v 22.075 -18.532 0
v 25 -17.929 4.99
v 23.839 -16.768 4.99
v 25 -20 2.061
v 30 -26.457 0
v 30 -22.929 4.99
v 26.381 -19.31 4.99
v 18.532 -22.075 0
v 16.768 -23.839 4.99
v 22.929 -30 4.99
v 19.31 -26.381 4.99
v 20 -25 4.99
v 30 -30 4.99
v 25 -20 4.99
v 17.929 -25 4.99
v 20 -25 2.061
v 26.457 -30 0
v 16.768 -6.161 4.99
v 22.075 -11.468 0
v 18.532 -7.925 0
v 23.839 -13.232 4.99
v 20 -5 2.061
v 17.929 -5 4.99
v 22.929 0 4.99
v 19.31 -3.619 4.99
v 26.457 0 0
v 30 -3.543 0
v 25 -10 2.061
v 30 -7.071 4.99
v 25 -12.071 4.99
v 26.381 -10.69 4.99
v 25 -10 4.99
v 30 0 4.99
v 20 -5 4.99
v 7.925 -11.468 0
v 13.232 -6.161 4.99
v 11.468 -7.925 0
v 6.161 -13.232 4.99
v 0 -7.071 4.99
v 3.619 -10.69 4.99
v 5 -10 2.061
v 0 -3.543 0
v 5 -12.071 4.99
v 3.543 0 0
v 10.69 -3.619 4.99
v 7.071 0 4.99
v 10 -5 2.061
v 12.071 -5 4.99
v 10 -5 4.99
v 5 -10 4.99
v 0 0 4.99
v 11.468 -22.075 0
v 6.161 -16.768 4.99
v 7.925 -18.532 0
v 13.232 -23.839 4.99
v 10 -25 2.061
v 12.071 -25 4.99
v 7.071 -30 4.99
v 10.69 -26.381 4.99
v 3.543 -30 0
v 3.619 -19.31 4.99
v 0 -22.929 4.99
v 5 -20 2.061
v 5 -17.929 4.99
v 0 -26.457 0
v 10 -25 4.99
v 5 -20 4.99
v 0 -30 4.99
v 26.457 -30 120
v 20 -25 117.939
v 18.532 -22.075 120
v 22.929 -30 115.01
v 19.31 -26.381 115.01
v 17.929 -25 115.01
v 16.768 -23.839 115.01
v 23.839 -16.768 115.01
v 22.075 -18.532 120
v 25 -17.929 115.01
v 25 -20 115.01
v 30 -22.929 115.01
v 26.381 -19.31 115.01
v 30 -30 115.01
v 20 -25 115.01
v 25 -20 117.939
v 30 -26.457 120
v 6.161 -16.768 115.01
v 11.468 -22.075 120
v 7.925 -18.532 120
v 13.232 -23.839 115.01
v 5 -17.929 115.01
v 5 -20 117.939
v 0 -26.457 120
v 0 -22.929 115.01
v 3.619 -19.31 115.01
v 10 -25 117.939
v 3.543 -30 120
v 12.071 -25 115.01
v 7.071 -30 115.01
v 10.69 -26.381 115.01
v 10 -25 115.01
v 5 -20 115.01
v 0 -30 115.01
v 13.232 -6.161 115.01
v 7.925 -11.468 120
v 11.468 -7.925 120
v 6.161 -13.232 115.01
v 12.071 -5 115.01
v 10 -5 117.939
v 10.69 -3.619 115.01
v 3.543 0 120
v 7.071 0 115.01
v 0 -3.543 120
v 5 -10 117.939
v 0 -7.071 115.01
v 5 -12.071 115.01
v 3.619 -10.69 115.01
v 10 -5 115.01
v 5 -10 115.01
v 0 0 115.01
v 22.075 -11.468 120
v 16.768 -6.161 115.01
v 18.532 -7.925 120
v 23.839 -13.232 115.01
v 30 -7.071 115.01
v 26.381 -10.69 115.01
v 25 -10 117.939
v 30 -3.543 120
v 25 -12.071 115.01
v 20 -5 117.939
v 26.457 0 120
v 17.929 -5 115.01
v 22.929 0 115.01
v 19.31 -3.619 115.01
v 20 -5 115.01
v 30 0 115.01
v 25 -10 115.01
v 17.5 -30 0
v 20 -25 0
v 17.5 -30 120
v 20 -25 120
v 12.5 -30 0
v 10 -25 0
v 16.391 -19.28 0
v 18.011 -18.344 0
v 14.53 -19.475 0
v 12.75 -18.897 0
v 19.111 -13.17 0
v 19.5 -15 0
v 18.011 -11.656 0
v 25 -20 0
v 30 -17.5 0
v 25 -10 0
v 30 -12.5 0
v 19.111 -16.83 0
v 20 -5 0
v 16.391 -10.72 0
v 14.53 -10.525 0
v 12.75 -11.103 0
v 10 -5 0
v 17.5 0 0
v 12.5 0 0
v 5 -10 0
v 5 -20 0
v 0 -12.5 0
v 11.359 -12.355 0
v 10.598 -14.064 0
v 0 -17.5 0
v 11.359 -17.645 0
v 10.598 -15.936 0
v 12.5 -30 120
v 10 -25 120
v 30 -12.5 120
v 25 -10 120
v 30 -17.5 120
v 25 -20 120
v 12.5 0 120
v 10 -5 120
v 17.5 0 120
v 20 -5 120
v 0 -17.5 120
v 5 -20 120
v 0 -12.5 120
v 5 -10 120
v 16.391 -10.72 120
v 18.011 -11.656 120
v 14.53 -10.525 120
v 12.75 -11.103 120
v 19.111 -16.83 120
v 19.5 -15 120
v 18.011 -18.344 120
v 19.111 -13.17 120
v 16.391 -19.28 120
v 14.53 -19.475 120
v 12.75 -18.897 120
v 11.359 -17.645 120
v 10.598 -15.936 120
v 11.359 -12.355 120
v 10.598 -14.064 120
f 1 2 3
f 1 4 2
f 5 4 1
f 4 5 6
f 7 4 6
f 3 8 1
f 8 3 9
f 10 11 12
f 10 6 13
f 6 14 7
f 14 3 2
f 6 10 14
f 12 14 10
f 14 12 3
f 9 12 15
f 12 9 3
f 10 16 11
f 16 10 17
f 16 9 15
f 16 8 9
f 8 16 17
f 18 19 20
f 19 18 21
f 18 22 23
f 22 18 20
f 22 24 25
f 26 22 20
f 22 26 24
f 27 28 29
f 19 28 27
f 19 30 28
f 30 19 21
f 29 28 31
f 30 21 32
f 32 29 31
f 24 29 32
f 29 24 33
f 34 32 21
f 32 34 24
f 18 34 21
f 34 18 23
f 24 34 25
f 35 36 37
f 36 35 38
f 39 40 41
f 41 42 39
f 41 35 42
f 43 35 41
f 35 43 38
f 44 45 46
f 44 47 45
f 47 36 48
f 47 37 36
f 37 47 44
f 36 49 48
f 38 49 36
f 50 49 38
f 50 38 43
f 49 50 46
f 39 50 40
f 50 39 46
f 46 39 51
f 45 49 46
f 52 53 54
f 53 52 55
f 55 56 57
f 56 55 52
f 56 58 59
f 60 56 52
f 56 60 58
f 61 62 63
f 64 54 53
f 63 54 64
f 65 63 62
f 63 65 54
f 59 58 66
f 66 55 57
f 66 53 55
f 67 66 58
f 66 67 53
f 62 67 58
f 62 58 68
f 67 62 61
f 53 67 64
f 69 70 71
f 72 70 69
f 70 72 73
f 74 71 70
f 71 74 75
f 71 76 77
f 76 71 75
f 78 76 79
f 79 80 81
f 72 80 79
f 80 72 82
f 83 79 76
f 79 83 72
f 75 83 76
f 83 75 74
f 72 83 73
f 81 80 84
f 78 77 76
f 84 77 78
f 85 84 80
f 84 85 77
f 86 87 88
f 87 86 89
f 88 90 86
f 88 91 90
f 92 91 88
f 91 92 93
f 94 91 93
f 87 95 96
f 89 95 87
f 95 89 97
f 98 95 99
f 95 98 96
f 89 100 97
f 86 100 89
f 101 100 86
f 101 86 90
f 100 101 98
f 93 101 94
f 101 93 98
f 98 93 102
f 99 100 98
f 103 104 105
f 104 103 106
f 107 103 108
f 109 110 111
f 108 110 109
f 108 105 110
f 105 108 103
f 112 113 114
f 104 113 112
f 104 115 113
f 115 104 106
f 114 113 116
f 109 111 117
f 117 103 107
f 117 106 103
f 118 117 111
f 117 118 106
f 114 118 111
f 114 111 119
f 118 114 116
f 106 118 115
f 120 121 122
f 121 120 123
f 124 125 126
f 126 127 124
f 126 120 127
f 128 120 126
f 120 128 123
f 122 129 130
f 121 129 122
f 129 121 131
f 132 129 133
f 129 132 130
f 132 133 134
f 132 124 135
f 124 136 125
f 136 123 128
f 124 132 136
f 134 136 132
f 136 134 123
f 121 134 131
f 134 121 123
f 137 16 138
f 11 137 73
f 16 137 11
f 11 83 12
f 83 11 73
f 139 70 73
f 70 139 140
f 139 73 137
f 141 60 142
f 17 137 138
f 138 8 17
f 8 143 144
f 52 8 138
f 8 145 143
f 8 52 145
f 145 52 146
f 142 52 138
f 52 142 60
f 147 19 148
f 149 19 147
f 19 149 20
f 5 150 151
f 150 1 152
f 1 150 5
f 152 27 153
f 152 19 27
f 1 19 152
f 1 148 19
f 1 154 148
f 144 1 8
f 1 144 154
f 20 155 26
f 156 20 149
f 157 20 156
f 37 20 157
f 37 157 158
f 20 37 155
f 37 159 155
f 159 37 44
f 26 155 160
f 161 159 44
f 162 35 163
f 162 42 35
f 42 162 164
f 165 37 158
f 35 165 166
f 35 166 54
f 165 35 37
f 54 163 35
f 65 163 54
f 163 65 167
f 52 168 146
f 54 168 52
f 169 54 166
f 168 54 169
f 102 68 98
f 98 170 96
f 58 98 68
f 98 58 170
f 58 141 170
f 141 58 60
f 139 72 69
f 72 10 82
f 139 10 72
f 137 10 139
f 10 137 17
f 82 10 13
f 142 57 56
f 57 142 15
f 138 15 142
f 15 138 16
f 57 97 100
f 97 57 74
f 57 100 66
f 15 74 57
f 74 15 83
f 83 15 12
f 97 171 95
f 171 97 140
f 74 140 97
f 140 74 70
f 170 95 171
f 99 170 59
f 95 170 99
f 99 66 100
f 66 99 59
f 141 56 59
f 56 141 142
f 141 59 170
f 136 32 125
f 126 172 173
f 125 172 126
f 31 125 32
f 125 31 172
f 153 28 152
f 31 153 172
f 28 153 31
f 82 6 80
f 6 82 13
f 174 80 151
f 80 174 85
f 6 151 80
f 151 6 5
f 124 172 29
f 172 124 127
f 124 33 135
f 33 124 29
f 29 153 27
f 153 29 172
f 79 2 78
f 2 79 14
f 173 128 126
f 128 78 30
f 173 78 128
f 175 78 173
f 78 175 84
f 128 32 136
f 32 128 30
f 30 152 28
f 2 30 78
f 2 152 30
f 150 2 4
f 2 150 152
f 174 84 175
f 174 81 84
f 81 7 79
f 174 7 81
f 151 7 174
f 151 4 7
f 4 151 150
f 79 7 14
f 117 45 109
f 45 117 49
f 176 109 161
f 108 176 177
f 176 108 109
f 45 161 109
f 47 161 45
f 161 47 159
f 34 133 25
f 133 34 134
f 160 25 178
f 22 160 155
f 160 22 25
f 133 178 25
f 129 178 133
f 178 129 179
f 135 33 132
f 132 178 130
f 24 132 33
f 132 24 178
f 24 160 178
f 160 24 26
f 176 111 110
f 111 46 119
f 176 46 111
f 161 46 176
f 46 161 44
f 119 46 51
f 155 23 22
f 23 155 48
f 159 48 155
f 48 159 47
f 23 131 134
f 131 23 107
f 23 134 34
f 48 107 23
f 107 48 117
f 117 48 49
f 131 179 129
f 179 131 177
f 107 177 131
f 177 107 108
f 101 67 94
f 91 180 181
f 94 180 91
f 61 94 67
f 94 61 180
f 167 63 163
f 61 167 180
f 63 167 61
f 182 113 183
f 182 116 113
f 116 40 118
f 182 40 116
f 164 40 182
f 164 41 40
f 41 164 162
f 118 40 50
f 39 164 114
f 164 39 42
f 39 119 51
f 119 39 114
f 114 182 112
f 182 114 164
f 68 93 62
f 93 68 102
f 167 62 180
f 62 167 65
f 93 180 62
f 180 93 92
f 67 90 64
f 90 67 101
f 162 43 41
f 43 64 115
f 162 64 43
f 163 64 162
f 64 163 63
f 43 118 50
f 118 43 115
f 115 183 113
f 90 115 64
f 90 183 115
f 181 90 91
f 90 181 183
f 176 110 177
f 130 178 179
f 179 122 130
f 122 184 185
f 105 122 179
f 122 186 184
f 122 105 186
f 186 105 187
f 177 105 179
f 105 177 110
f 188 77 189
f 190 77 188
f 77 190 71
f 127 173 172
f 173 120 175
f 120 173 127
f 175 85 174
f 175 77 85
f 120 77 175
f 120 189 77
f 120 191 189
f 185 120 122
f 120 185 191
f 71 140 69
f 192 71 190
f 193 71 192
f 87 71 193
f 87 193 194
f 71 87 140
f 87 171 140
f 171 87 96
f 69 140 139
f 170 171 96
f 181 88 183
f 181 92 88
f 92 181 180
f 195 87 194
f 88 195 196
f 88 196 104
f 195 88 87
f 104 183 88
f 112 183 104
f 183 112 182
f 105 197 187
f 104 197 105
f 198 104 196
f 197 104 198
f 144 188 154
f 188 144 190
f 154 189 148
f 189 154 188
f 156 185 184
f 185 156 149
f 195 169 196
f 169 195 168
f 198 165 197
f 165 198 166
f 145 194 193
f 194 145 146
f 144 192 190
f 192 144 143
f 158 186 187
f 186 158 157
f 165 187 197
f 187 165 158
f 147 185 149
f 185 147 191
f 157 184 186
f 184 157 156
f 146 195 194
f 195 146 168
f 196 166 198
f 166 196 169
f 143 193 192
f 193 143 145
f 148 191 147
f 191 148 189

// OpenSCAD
// file: globals.scad
/*
Most things in this file is represented as one millimeter, so keep that in mind while changing things.
Some of the setting are not mm but at variables that you can set, such as 2*x=2x and you are setting what x is.
I will try to specify when things are variables and not exact measurements.
*/

obj_leg = 30;
leg_length = 5.5;
small_number = 0.001;
metal_core_rode_global = 5;


///////////////// number of holes /////////////////////
z_hole_number = 8;
other_holes = 8;

///////////////// Pins /////////////////////

//pins that poke out
ball_size = 10;
pin_height = 20;
pin_diameter = 6;


//holes
hole_ball_size = ball_size;
hole_pin_height = pin_height;
hole_pin_diameter = pin_diameter;

///////////////// Z THINGS /////////////////////

berring_slot_width = 7.5;
berring_slot_depth = 6.5;
metal_core_rode = 5;

///////////////// X THINGS /////////////////////

//male dove tails
max_width=10;
min_width=5;
depth=5;
height=obj_leg/2;

//female dove tails, this is found on the y mounts
girl_max_width=11;
girl_min_width=5;
girl_depth=5;
girl_height=obj_leg;


///////////////// Y THINGS /////////////////////
/*
The Y is so normal that all of those global variables at the top should change all of the setting in it, this section is set her incase there are variables set in the future development of this project.
*/
// file: include.scad
//////////////////      END SECTION       //////////////////

	module added_pins(){
		difference(){
			union(){
				translate([30/(15/4),obj_leg*leg_length,30/(15/4)]) pin();
				translate([30/(15/4)+14.5,obj_leg*leg_length,30/(15/4)+14]) pin();
			}
			union(){
							translate([30/(15/4)+13.5,obj_leg*leg_length-20,30/(15/4)+5])cube(size=[2,40,15]);
							translate([30/(15/4)+7.5,obj_leg*leg_length-20,30/(15/4)+15])rotate([0,90,0]) cube(size=[2,40,15]);	

							translate([30/(15/4)-1,obj_leg*leg_length-20,30/(15/4)-8])cube(size=[2,40,15]);
							translate([30/(15/4)-10,obj_leg*leg_length-20,30/(15/4)+1])rotate([0,90,0]) cube(size=[2,40,15]);
			}
		}
	}
	module taken_pins() {
		translate([30/(15/4)+14,obj_leg*leg_length-10,30/(15/4)]) mirror_pin();
		translate([30/(15/4),obj_leg*leg_length-10,30/(15/4)+15]) mirror_pin();
	}


//////////////////      OTHER STUFF       //////////////////

	module holes() {
		rotate([0,0,90]) for(y=[0:other_holes])
		translate([obj_leg+y*15,-15.5,7.5]) union() {
			translate([7.5,0,15]) hole_up();
			hole_down();
		}
	}
	module extend_holes() {
	module top(){
		rotate([0,0,90]) for(y=[0:other_holes+1])
		translate([(30/4)+y*15,-15.5,7.5]) union() {
			translate([7.5,0,15]) hole_up();
		}
	}
	module bottom(){
		rotate([0,0,90]) for(y=[0:other_holes+2])
		translate([(30/4)+y*15,-15.5,7.5]) union() {
			hole_down();
		
}
	}
	union(){
		top();
		bottom();
	}
	}

	module hole() {
		union() {
			rotate([90, 90, 0]) cylinder(h=40, d=hole_pin_diameter, center=true);
			translate([0,7.5,0]) sphere(d=hole_ball_size);
			translate([0,-6,0]) sphere(d=hole_ball_size);
		}
	}
	module hole_up() {
		union() {
			rotate([90, 90, 0]) cylinder(h=40, d=hole_pin_diameter, center=true);
			translate([0,7.5,10]) cylinder(h=hole_pin_height, d=hole_pin_diameter, center=true);
			translate([0,-6,10]) cylinder(h=hole_pin_height, d=hole_pin_diameter, center=true);
			translate([0,7.5,0]) sphere(d=hole_ball_size);
			translate([0,-6,0]) sphere(d=hole_ball_size);
		}
	}
	module hole_down() {
		union() {
			rotate([90, 90, 0]) cylinder(h=40, d=hole_pin_diameter, center=true);
			translate([0,7.5,-10]) cylinder(h=hole_pin_height, d=hole_pin_diameter, center=true);
			translate([0,-6,-10]) cylinder(h=hole_pin_height, d=hole_pin_diameter, center=true);
			translate([0,7.5,0]) sphere(d=hole_ball_size);
			translate([0,-6,0]) sphere(d=hole_ball_size);
		}
	}
	module pin() {
		union() {
			rotate([90, 90, 0]) cylinder(h=pin_height, d=pin_diameter, center=true);
			translate([0,7.5,0]) sphere(d=ball_size);
		}
	}

	module mirror_pin() {
		rotate([90, 90, 0]) cylinder(h=hole_pin_height+small_number, d=hole_pin_diameter, center=true);
		translate([0,-(pin_height-(ball_size/2)),0]) sphere(d=ball_size);
	}


//////////////////      SOME RACK AND Z THINGS       //////////////////

module z_holes() {
    rotate([0,-90,0]) for(z=[0:z_hole_number])
    translate([22.5+z*15,16,-12])
        hole();
}

module pin_cuts() {
	union(){
		cube(size=[2,10,40], center=true);
		rotate([0,0,90]) cube(size=[2,10,40], center=true);
	}
}
module pin_uncut() {
	union(){
		rotate([0, 0, 90]) cylinder(h=hole_pin_height, d=hole_pin_diameter, center=true);
		translate([0,0,10]) sphere(d=ball_hole);
	}
}


module pin_out() {
	union(){
		rotate([0, 0, 90]) cylinder(h=pin_height, d=pin_diameter, center=true);
		translate([0,0,10]) sphere(d= ball_size);
	}
}


module pins_z(){
	difference() {
		pin_out();
		pin_cuts();
	}
}
//////////////////      RACK AND SLIDE     ///////////////////

module straight_pins() {
	for(z=[0:((((obj_leg*leg_length)*2)-(obj_leg*2))/3)/14.5]) rotate([-90,0,0]) translate([z*15,30/(15/4),14]) pins_z();
	for(z=[0:((((obj_leg*leg_length)*2)-(obj_leg*2))/3)/14.5]) rotate([-90,0,0]) translate([z*15,30/(15/4)-14,14]) pins_z();
}
module stagger_pins() {
	for(z=[0:((((obj_leg*leg_length)*2)-(obj_leg*2))/3)/14.5]) rotate([-90,0,0]) translate([z*15,30/(15/4),14]) pins_z();
	for(z=[0:((((obj_leg*leg_length)*2)-(obj_leg*2))/3)/14.5]) rotate([-90,0,0]) translate([z*15+7,30/(15/4)-14,14]) pins_z();
}


//////////////////      DOVE TAIL       //////////////////

module male_dovetail(height) {
	dovetail_3d(max_width,min_width,depth,height);
}

module dovetail_3d(max_width=11, min_width=5, depth=5, height=30) {
	linear_extrude(height=height, convexity=2)
		dovetail_2d(max_width,min_width,depth);
}

module dovetail_2d(max_width=11, min_width=5, depth=5) {
	angle=atan((max_width/2-min_width/2)/depth);
	echo("angle: ", angle);
	polygon(paths=[[0,1,2,3,0]], points=[[-min_width/2,0], [-max_width/2,depth], [max_width/2, depth], [min_width/2,0]]);
}

//bow tie
	module tie_end(height){
				rotate([0,0,0]) translate([0,-0.01,((obj_leg/2)/2)]) male_dovetail(height);
				rotate([0,90,0]) translate([0,-0.01,((obj_leg/2)/2)]) male_dovetail(height);
				rotate([0,180,0]) translate([0,-0.01,((obj_leg/2)/2)]) male_dovetail(height);
				rotate([0,-90,0]) translate([0,-0.01,((obj_leg/2)/2)]) male_dovetail(height);
	}

module bow_support(){
	difference(){
		intersection(){
			translate([-15,0,-15]) cube([30,9,30]);
			scale([1.05,1.05,1.05]) rotate([0,45,0]) tie_end();
		}
		cube([29.2,29.2,29.2], center=true);
	}
}

	module wrap(){
		depth = 30;
				translate([-15,30,15]) rotate([90,180,90]) male_dovetail(height=depth);
				rotate([0,90,0]) translate([-15,30,15]) rotate([90,180,90]) male_dovetail(height=depth);
				rotate([0,180,0]) translate([-15,30,15]) rotate([90,180,90]) male_dovetail(height=depth);
				rotate([0,-90,0]) translate([-15,30,15]) rotate([90,180,90]) male_dovetail(height=depth);
	}
// main file
include <include.scad>;
include <globals.scad>;
metal_rod_size = 9;
support = false;
//min number of units is 2
//max is however large your printer can print
units = 4;

module extention(){
	
	module added(){
			translate([0,0,0]) cube([30,30*units,30]);
	}

	module subtracted(){
	translate([15,0,15]) rotate([0,45,0]) tie_end();
	translate([15,units*30,15]) rotate([0,45,0]) rotate([0,0,180]) tie_end();
	translate([15,15,15]) rotate([90,0,0]) cylinder(h=5000, d= metal_rod_size, center=true);

	for (y = [-1:units-2]) // two iterations, z = -1, z = 1
	{
			translate([15, (y*30)+15, 15]){
			for (r = [0:4]) // two iterations, z = -1, z = 1
			{
				rotate([0,r*90,0]) translate([0,15,15]) rotate([-90,0,0])male_dovetail(height=30);
			}
		}
	}

	} //subtracted
	difference(){
		added();
		subtracted();
	}	
} //module extention

//support
if (support==true)
{
	translate([0,0,5/2]) cylinder(h=5, d=6, center=true);
	translate([30,0,5/2]) cylinder(h=5, d=6, center=true);
	translate([0,-30,5/2]) cylinder(h=5, d=6, center=true);
	translate([30,-30,5/2]) cylinder(h=5, d=6, center=true);
}

module extention_finished(){
		rotate([90,0,0]) extention();
}

extention_finished();
